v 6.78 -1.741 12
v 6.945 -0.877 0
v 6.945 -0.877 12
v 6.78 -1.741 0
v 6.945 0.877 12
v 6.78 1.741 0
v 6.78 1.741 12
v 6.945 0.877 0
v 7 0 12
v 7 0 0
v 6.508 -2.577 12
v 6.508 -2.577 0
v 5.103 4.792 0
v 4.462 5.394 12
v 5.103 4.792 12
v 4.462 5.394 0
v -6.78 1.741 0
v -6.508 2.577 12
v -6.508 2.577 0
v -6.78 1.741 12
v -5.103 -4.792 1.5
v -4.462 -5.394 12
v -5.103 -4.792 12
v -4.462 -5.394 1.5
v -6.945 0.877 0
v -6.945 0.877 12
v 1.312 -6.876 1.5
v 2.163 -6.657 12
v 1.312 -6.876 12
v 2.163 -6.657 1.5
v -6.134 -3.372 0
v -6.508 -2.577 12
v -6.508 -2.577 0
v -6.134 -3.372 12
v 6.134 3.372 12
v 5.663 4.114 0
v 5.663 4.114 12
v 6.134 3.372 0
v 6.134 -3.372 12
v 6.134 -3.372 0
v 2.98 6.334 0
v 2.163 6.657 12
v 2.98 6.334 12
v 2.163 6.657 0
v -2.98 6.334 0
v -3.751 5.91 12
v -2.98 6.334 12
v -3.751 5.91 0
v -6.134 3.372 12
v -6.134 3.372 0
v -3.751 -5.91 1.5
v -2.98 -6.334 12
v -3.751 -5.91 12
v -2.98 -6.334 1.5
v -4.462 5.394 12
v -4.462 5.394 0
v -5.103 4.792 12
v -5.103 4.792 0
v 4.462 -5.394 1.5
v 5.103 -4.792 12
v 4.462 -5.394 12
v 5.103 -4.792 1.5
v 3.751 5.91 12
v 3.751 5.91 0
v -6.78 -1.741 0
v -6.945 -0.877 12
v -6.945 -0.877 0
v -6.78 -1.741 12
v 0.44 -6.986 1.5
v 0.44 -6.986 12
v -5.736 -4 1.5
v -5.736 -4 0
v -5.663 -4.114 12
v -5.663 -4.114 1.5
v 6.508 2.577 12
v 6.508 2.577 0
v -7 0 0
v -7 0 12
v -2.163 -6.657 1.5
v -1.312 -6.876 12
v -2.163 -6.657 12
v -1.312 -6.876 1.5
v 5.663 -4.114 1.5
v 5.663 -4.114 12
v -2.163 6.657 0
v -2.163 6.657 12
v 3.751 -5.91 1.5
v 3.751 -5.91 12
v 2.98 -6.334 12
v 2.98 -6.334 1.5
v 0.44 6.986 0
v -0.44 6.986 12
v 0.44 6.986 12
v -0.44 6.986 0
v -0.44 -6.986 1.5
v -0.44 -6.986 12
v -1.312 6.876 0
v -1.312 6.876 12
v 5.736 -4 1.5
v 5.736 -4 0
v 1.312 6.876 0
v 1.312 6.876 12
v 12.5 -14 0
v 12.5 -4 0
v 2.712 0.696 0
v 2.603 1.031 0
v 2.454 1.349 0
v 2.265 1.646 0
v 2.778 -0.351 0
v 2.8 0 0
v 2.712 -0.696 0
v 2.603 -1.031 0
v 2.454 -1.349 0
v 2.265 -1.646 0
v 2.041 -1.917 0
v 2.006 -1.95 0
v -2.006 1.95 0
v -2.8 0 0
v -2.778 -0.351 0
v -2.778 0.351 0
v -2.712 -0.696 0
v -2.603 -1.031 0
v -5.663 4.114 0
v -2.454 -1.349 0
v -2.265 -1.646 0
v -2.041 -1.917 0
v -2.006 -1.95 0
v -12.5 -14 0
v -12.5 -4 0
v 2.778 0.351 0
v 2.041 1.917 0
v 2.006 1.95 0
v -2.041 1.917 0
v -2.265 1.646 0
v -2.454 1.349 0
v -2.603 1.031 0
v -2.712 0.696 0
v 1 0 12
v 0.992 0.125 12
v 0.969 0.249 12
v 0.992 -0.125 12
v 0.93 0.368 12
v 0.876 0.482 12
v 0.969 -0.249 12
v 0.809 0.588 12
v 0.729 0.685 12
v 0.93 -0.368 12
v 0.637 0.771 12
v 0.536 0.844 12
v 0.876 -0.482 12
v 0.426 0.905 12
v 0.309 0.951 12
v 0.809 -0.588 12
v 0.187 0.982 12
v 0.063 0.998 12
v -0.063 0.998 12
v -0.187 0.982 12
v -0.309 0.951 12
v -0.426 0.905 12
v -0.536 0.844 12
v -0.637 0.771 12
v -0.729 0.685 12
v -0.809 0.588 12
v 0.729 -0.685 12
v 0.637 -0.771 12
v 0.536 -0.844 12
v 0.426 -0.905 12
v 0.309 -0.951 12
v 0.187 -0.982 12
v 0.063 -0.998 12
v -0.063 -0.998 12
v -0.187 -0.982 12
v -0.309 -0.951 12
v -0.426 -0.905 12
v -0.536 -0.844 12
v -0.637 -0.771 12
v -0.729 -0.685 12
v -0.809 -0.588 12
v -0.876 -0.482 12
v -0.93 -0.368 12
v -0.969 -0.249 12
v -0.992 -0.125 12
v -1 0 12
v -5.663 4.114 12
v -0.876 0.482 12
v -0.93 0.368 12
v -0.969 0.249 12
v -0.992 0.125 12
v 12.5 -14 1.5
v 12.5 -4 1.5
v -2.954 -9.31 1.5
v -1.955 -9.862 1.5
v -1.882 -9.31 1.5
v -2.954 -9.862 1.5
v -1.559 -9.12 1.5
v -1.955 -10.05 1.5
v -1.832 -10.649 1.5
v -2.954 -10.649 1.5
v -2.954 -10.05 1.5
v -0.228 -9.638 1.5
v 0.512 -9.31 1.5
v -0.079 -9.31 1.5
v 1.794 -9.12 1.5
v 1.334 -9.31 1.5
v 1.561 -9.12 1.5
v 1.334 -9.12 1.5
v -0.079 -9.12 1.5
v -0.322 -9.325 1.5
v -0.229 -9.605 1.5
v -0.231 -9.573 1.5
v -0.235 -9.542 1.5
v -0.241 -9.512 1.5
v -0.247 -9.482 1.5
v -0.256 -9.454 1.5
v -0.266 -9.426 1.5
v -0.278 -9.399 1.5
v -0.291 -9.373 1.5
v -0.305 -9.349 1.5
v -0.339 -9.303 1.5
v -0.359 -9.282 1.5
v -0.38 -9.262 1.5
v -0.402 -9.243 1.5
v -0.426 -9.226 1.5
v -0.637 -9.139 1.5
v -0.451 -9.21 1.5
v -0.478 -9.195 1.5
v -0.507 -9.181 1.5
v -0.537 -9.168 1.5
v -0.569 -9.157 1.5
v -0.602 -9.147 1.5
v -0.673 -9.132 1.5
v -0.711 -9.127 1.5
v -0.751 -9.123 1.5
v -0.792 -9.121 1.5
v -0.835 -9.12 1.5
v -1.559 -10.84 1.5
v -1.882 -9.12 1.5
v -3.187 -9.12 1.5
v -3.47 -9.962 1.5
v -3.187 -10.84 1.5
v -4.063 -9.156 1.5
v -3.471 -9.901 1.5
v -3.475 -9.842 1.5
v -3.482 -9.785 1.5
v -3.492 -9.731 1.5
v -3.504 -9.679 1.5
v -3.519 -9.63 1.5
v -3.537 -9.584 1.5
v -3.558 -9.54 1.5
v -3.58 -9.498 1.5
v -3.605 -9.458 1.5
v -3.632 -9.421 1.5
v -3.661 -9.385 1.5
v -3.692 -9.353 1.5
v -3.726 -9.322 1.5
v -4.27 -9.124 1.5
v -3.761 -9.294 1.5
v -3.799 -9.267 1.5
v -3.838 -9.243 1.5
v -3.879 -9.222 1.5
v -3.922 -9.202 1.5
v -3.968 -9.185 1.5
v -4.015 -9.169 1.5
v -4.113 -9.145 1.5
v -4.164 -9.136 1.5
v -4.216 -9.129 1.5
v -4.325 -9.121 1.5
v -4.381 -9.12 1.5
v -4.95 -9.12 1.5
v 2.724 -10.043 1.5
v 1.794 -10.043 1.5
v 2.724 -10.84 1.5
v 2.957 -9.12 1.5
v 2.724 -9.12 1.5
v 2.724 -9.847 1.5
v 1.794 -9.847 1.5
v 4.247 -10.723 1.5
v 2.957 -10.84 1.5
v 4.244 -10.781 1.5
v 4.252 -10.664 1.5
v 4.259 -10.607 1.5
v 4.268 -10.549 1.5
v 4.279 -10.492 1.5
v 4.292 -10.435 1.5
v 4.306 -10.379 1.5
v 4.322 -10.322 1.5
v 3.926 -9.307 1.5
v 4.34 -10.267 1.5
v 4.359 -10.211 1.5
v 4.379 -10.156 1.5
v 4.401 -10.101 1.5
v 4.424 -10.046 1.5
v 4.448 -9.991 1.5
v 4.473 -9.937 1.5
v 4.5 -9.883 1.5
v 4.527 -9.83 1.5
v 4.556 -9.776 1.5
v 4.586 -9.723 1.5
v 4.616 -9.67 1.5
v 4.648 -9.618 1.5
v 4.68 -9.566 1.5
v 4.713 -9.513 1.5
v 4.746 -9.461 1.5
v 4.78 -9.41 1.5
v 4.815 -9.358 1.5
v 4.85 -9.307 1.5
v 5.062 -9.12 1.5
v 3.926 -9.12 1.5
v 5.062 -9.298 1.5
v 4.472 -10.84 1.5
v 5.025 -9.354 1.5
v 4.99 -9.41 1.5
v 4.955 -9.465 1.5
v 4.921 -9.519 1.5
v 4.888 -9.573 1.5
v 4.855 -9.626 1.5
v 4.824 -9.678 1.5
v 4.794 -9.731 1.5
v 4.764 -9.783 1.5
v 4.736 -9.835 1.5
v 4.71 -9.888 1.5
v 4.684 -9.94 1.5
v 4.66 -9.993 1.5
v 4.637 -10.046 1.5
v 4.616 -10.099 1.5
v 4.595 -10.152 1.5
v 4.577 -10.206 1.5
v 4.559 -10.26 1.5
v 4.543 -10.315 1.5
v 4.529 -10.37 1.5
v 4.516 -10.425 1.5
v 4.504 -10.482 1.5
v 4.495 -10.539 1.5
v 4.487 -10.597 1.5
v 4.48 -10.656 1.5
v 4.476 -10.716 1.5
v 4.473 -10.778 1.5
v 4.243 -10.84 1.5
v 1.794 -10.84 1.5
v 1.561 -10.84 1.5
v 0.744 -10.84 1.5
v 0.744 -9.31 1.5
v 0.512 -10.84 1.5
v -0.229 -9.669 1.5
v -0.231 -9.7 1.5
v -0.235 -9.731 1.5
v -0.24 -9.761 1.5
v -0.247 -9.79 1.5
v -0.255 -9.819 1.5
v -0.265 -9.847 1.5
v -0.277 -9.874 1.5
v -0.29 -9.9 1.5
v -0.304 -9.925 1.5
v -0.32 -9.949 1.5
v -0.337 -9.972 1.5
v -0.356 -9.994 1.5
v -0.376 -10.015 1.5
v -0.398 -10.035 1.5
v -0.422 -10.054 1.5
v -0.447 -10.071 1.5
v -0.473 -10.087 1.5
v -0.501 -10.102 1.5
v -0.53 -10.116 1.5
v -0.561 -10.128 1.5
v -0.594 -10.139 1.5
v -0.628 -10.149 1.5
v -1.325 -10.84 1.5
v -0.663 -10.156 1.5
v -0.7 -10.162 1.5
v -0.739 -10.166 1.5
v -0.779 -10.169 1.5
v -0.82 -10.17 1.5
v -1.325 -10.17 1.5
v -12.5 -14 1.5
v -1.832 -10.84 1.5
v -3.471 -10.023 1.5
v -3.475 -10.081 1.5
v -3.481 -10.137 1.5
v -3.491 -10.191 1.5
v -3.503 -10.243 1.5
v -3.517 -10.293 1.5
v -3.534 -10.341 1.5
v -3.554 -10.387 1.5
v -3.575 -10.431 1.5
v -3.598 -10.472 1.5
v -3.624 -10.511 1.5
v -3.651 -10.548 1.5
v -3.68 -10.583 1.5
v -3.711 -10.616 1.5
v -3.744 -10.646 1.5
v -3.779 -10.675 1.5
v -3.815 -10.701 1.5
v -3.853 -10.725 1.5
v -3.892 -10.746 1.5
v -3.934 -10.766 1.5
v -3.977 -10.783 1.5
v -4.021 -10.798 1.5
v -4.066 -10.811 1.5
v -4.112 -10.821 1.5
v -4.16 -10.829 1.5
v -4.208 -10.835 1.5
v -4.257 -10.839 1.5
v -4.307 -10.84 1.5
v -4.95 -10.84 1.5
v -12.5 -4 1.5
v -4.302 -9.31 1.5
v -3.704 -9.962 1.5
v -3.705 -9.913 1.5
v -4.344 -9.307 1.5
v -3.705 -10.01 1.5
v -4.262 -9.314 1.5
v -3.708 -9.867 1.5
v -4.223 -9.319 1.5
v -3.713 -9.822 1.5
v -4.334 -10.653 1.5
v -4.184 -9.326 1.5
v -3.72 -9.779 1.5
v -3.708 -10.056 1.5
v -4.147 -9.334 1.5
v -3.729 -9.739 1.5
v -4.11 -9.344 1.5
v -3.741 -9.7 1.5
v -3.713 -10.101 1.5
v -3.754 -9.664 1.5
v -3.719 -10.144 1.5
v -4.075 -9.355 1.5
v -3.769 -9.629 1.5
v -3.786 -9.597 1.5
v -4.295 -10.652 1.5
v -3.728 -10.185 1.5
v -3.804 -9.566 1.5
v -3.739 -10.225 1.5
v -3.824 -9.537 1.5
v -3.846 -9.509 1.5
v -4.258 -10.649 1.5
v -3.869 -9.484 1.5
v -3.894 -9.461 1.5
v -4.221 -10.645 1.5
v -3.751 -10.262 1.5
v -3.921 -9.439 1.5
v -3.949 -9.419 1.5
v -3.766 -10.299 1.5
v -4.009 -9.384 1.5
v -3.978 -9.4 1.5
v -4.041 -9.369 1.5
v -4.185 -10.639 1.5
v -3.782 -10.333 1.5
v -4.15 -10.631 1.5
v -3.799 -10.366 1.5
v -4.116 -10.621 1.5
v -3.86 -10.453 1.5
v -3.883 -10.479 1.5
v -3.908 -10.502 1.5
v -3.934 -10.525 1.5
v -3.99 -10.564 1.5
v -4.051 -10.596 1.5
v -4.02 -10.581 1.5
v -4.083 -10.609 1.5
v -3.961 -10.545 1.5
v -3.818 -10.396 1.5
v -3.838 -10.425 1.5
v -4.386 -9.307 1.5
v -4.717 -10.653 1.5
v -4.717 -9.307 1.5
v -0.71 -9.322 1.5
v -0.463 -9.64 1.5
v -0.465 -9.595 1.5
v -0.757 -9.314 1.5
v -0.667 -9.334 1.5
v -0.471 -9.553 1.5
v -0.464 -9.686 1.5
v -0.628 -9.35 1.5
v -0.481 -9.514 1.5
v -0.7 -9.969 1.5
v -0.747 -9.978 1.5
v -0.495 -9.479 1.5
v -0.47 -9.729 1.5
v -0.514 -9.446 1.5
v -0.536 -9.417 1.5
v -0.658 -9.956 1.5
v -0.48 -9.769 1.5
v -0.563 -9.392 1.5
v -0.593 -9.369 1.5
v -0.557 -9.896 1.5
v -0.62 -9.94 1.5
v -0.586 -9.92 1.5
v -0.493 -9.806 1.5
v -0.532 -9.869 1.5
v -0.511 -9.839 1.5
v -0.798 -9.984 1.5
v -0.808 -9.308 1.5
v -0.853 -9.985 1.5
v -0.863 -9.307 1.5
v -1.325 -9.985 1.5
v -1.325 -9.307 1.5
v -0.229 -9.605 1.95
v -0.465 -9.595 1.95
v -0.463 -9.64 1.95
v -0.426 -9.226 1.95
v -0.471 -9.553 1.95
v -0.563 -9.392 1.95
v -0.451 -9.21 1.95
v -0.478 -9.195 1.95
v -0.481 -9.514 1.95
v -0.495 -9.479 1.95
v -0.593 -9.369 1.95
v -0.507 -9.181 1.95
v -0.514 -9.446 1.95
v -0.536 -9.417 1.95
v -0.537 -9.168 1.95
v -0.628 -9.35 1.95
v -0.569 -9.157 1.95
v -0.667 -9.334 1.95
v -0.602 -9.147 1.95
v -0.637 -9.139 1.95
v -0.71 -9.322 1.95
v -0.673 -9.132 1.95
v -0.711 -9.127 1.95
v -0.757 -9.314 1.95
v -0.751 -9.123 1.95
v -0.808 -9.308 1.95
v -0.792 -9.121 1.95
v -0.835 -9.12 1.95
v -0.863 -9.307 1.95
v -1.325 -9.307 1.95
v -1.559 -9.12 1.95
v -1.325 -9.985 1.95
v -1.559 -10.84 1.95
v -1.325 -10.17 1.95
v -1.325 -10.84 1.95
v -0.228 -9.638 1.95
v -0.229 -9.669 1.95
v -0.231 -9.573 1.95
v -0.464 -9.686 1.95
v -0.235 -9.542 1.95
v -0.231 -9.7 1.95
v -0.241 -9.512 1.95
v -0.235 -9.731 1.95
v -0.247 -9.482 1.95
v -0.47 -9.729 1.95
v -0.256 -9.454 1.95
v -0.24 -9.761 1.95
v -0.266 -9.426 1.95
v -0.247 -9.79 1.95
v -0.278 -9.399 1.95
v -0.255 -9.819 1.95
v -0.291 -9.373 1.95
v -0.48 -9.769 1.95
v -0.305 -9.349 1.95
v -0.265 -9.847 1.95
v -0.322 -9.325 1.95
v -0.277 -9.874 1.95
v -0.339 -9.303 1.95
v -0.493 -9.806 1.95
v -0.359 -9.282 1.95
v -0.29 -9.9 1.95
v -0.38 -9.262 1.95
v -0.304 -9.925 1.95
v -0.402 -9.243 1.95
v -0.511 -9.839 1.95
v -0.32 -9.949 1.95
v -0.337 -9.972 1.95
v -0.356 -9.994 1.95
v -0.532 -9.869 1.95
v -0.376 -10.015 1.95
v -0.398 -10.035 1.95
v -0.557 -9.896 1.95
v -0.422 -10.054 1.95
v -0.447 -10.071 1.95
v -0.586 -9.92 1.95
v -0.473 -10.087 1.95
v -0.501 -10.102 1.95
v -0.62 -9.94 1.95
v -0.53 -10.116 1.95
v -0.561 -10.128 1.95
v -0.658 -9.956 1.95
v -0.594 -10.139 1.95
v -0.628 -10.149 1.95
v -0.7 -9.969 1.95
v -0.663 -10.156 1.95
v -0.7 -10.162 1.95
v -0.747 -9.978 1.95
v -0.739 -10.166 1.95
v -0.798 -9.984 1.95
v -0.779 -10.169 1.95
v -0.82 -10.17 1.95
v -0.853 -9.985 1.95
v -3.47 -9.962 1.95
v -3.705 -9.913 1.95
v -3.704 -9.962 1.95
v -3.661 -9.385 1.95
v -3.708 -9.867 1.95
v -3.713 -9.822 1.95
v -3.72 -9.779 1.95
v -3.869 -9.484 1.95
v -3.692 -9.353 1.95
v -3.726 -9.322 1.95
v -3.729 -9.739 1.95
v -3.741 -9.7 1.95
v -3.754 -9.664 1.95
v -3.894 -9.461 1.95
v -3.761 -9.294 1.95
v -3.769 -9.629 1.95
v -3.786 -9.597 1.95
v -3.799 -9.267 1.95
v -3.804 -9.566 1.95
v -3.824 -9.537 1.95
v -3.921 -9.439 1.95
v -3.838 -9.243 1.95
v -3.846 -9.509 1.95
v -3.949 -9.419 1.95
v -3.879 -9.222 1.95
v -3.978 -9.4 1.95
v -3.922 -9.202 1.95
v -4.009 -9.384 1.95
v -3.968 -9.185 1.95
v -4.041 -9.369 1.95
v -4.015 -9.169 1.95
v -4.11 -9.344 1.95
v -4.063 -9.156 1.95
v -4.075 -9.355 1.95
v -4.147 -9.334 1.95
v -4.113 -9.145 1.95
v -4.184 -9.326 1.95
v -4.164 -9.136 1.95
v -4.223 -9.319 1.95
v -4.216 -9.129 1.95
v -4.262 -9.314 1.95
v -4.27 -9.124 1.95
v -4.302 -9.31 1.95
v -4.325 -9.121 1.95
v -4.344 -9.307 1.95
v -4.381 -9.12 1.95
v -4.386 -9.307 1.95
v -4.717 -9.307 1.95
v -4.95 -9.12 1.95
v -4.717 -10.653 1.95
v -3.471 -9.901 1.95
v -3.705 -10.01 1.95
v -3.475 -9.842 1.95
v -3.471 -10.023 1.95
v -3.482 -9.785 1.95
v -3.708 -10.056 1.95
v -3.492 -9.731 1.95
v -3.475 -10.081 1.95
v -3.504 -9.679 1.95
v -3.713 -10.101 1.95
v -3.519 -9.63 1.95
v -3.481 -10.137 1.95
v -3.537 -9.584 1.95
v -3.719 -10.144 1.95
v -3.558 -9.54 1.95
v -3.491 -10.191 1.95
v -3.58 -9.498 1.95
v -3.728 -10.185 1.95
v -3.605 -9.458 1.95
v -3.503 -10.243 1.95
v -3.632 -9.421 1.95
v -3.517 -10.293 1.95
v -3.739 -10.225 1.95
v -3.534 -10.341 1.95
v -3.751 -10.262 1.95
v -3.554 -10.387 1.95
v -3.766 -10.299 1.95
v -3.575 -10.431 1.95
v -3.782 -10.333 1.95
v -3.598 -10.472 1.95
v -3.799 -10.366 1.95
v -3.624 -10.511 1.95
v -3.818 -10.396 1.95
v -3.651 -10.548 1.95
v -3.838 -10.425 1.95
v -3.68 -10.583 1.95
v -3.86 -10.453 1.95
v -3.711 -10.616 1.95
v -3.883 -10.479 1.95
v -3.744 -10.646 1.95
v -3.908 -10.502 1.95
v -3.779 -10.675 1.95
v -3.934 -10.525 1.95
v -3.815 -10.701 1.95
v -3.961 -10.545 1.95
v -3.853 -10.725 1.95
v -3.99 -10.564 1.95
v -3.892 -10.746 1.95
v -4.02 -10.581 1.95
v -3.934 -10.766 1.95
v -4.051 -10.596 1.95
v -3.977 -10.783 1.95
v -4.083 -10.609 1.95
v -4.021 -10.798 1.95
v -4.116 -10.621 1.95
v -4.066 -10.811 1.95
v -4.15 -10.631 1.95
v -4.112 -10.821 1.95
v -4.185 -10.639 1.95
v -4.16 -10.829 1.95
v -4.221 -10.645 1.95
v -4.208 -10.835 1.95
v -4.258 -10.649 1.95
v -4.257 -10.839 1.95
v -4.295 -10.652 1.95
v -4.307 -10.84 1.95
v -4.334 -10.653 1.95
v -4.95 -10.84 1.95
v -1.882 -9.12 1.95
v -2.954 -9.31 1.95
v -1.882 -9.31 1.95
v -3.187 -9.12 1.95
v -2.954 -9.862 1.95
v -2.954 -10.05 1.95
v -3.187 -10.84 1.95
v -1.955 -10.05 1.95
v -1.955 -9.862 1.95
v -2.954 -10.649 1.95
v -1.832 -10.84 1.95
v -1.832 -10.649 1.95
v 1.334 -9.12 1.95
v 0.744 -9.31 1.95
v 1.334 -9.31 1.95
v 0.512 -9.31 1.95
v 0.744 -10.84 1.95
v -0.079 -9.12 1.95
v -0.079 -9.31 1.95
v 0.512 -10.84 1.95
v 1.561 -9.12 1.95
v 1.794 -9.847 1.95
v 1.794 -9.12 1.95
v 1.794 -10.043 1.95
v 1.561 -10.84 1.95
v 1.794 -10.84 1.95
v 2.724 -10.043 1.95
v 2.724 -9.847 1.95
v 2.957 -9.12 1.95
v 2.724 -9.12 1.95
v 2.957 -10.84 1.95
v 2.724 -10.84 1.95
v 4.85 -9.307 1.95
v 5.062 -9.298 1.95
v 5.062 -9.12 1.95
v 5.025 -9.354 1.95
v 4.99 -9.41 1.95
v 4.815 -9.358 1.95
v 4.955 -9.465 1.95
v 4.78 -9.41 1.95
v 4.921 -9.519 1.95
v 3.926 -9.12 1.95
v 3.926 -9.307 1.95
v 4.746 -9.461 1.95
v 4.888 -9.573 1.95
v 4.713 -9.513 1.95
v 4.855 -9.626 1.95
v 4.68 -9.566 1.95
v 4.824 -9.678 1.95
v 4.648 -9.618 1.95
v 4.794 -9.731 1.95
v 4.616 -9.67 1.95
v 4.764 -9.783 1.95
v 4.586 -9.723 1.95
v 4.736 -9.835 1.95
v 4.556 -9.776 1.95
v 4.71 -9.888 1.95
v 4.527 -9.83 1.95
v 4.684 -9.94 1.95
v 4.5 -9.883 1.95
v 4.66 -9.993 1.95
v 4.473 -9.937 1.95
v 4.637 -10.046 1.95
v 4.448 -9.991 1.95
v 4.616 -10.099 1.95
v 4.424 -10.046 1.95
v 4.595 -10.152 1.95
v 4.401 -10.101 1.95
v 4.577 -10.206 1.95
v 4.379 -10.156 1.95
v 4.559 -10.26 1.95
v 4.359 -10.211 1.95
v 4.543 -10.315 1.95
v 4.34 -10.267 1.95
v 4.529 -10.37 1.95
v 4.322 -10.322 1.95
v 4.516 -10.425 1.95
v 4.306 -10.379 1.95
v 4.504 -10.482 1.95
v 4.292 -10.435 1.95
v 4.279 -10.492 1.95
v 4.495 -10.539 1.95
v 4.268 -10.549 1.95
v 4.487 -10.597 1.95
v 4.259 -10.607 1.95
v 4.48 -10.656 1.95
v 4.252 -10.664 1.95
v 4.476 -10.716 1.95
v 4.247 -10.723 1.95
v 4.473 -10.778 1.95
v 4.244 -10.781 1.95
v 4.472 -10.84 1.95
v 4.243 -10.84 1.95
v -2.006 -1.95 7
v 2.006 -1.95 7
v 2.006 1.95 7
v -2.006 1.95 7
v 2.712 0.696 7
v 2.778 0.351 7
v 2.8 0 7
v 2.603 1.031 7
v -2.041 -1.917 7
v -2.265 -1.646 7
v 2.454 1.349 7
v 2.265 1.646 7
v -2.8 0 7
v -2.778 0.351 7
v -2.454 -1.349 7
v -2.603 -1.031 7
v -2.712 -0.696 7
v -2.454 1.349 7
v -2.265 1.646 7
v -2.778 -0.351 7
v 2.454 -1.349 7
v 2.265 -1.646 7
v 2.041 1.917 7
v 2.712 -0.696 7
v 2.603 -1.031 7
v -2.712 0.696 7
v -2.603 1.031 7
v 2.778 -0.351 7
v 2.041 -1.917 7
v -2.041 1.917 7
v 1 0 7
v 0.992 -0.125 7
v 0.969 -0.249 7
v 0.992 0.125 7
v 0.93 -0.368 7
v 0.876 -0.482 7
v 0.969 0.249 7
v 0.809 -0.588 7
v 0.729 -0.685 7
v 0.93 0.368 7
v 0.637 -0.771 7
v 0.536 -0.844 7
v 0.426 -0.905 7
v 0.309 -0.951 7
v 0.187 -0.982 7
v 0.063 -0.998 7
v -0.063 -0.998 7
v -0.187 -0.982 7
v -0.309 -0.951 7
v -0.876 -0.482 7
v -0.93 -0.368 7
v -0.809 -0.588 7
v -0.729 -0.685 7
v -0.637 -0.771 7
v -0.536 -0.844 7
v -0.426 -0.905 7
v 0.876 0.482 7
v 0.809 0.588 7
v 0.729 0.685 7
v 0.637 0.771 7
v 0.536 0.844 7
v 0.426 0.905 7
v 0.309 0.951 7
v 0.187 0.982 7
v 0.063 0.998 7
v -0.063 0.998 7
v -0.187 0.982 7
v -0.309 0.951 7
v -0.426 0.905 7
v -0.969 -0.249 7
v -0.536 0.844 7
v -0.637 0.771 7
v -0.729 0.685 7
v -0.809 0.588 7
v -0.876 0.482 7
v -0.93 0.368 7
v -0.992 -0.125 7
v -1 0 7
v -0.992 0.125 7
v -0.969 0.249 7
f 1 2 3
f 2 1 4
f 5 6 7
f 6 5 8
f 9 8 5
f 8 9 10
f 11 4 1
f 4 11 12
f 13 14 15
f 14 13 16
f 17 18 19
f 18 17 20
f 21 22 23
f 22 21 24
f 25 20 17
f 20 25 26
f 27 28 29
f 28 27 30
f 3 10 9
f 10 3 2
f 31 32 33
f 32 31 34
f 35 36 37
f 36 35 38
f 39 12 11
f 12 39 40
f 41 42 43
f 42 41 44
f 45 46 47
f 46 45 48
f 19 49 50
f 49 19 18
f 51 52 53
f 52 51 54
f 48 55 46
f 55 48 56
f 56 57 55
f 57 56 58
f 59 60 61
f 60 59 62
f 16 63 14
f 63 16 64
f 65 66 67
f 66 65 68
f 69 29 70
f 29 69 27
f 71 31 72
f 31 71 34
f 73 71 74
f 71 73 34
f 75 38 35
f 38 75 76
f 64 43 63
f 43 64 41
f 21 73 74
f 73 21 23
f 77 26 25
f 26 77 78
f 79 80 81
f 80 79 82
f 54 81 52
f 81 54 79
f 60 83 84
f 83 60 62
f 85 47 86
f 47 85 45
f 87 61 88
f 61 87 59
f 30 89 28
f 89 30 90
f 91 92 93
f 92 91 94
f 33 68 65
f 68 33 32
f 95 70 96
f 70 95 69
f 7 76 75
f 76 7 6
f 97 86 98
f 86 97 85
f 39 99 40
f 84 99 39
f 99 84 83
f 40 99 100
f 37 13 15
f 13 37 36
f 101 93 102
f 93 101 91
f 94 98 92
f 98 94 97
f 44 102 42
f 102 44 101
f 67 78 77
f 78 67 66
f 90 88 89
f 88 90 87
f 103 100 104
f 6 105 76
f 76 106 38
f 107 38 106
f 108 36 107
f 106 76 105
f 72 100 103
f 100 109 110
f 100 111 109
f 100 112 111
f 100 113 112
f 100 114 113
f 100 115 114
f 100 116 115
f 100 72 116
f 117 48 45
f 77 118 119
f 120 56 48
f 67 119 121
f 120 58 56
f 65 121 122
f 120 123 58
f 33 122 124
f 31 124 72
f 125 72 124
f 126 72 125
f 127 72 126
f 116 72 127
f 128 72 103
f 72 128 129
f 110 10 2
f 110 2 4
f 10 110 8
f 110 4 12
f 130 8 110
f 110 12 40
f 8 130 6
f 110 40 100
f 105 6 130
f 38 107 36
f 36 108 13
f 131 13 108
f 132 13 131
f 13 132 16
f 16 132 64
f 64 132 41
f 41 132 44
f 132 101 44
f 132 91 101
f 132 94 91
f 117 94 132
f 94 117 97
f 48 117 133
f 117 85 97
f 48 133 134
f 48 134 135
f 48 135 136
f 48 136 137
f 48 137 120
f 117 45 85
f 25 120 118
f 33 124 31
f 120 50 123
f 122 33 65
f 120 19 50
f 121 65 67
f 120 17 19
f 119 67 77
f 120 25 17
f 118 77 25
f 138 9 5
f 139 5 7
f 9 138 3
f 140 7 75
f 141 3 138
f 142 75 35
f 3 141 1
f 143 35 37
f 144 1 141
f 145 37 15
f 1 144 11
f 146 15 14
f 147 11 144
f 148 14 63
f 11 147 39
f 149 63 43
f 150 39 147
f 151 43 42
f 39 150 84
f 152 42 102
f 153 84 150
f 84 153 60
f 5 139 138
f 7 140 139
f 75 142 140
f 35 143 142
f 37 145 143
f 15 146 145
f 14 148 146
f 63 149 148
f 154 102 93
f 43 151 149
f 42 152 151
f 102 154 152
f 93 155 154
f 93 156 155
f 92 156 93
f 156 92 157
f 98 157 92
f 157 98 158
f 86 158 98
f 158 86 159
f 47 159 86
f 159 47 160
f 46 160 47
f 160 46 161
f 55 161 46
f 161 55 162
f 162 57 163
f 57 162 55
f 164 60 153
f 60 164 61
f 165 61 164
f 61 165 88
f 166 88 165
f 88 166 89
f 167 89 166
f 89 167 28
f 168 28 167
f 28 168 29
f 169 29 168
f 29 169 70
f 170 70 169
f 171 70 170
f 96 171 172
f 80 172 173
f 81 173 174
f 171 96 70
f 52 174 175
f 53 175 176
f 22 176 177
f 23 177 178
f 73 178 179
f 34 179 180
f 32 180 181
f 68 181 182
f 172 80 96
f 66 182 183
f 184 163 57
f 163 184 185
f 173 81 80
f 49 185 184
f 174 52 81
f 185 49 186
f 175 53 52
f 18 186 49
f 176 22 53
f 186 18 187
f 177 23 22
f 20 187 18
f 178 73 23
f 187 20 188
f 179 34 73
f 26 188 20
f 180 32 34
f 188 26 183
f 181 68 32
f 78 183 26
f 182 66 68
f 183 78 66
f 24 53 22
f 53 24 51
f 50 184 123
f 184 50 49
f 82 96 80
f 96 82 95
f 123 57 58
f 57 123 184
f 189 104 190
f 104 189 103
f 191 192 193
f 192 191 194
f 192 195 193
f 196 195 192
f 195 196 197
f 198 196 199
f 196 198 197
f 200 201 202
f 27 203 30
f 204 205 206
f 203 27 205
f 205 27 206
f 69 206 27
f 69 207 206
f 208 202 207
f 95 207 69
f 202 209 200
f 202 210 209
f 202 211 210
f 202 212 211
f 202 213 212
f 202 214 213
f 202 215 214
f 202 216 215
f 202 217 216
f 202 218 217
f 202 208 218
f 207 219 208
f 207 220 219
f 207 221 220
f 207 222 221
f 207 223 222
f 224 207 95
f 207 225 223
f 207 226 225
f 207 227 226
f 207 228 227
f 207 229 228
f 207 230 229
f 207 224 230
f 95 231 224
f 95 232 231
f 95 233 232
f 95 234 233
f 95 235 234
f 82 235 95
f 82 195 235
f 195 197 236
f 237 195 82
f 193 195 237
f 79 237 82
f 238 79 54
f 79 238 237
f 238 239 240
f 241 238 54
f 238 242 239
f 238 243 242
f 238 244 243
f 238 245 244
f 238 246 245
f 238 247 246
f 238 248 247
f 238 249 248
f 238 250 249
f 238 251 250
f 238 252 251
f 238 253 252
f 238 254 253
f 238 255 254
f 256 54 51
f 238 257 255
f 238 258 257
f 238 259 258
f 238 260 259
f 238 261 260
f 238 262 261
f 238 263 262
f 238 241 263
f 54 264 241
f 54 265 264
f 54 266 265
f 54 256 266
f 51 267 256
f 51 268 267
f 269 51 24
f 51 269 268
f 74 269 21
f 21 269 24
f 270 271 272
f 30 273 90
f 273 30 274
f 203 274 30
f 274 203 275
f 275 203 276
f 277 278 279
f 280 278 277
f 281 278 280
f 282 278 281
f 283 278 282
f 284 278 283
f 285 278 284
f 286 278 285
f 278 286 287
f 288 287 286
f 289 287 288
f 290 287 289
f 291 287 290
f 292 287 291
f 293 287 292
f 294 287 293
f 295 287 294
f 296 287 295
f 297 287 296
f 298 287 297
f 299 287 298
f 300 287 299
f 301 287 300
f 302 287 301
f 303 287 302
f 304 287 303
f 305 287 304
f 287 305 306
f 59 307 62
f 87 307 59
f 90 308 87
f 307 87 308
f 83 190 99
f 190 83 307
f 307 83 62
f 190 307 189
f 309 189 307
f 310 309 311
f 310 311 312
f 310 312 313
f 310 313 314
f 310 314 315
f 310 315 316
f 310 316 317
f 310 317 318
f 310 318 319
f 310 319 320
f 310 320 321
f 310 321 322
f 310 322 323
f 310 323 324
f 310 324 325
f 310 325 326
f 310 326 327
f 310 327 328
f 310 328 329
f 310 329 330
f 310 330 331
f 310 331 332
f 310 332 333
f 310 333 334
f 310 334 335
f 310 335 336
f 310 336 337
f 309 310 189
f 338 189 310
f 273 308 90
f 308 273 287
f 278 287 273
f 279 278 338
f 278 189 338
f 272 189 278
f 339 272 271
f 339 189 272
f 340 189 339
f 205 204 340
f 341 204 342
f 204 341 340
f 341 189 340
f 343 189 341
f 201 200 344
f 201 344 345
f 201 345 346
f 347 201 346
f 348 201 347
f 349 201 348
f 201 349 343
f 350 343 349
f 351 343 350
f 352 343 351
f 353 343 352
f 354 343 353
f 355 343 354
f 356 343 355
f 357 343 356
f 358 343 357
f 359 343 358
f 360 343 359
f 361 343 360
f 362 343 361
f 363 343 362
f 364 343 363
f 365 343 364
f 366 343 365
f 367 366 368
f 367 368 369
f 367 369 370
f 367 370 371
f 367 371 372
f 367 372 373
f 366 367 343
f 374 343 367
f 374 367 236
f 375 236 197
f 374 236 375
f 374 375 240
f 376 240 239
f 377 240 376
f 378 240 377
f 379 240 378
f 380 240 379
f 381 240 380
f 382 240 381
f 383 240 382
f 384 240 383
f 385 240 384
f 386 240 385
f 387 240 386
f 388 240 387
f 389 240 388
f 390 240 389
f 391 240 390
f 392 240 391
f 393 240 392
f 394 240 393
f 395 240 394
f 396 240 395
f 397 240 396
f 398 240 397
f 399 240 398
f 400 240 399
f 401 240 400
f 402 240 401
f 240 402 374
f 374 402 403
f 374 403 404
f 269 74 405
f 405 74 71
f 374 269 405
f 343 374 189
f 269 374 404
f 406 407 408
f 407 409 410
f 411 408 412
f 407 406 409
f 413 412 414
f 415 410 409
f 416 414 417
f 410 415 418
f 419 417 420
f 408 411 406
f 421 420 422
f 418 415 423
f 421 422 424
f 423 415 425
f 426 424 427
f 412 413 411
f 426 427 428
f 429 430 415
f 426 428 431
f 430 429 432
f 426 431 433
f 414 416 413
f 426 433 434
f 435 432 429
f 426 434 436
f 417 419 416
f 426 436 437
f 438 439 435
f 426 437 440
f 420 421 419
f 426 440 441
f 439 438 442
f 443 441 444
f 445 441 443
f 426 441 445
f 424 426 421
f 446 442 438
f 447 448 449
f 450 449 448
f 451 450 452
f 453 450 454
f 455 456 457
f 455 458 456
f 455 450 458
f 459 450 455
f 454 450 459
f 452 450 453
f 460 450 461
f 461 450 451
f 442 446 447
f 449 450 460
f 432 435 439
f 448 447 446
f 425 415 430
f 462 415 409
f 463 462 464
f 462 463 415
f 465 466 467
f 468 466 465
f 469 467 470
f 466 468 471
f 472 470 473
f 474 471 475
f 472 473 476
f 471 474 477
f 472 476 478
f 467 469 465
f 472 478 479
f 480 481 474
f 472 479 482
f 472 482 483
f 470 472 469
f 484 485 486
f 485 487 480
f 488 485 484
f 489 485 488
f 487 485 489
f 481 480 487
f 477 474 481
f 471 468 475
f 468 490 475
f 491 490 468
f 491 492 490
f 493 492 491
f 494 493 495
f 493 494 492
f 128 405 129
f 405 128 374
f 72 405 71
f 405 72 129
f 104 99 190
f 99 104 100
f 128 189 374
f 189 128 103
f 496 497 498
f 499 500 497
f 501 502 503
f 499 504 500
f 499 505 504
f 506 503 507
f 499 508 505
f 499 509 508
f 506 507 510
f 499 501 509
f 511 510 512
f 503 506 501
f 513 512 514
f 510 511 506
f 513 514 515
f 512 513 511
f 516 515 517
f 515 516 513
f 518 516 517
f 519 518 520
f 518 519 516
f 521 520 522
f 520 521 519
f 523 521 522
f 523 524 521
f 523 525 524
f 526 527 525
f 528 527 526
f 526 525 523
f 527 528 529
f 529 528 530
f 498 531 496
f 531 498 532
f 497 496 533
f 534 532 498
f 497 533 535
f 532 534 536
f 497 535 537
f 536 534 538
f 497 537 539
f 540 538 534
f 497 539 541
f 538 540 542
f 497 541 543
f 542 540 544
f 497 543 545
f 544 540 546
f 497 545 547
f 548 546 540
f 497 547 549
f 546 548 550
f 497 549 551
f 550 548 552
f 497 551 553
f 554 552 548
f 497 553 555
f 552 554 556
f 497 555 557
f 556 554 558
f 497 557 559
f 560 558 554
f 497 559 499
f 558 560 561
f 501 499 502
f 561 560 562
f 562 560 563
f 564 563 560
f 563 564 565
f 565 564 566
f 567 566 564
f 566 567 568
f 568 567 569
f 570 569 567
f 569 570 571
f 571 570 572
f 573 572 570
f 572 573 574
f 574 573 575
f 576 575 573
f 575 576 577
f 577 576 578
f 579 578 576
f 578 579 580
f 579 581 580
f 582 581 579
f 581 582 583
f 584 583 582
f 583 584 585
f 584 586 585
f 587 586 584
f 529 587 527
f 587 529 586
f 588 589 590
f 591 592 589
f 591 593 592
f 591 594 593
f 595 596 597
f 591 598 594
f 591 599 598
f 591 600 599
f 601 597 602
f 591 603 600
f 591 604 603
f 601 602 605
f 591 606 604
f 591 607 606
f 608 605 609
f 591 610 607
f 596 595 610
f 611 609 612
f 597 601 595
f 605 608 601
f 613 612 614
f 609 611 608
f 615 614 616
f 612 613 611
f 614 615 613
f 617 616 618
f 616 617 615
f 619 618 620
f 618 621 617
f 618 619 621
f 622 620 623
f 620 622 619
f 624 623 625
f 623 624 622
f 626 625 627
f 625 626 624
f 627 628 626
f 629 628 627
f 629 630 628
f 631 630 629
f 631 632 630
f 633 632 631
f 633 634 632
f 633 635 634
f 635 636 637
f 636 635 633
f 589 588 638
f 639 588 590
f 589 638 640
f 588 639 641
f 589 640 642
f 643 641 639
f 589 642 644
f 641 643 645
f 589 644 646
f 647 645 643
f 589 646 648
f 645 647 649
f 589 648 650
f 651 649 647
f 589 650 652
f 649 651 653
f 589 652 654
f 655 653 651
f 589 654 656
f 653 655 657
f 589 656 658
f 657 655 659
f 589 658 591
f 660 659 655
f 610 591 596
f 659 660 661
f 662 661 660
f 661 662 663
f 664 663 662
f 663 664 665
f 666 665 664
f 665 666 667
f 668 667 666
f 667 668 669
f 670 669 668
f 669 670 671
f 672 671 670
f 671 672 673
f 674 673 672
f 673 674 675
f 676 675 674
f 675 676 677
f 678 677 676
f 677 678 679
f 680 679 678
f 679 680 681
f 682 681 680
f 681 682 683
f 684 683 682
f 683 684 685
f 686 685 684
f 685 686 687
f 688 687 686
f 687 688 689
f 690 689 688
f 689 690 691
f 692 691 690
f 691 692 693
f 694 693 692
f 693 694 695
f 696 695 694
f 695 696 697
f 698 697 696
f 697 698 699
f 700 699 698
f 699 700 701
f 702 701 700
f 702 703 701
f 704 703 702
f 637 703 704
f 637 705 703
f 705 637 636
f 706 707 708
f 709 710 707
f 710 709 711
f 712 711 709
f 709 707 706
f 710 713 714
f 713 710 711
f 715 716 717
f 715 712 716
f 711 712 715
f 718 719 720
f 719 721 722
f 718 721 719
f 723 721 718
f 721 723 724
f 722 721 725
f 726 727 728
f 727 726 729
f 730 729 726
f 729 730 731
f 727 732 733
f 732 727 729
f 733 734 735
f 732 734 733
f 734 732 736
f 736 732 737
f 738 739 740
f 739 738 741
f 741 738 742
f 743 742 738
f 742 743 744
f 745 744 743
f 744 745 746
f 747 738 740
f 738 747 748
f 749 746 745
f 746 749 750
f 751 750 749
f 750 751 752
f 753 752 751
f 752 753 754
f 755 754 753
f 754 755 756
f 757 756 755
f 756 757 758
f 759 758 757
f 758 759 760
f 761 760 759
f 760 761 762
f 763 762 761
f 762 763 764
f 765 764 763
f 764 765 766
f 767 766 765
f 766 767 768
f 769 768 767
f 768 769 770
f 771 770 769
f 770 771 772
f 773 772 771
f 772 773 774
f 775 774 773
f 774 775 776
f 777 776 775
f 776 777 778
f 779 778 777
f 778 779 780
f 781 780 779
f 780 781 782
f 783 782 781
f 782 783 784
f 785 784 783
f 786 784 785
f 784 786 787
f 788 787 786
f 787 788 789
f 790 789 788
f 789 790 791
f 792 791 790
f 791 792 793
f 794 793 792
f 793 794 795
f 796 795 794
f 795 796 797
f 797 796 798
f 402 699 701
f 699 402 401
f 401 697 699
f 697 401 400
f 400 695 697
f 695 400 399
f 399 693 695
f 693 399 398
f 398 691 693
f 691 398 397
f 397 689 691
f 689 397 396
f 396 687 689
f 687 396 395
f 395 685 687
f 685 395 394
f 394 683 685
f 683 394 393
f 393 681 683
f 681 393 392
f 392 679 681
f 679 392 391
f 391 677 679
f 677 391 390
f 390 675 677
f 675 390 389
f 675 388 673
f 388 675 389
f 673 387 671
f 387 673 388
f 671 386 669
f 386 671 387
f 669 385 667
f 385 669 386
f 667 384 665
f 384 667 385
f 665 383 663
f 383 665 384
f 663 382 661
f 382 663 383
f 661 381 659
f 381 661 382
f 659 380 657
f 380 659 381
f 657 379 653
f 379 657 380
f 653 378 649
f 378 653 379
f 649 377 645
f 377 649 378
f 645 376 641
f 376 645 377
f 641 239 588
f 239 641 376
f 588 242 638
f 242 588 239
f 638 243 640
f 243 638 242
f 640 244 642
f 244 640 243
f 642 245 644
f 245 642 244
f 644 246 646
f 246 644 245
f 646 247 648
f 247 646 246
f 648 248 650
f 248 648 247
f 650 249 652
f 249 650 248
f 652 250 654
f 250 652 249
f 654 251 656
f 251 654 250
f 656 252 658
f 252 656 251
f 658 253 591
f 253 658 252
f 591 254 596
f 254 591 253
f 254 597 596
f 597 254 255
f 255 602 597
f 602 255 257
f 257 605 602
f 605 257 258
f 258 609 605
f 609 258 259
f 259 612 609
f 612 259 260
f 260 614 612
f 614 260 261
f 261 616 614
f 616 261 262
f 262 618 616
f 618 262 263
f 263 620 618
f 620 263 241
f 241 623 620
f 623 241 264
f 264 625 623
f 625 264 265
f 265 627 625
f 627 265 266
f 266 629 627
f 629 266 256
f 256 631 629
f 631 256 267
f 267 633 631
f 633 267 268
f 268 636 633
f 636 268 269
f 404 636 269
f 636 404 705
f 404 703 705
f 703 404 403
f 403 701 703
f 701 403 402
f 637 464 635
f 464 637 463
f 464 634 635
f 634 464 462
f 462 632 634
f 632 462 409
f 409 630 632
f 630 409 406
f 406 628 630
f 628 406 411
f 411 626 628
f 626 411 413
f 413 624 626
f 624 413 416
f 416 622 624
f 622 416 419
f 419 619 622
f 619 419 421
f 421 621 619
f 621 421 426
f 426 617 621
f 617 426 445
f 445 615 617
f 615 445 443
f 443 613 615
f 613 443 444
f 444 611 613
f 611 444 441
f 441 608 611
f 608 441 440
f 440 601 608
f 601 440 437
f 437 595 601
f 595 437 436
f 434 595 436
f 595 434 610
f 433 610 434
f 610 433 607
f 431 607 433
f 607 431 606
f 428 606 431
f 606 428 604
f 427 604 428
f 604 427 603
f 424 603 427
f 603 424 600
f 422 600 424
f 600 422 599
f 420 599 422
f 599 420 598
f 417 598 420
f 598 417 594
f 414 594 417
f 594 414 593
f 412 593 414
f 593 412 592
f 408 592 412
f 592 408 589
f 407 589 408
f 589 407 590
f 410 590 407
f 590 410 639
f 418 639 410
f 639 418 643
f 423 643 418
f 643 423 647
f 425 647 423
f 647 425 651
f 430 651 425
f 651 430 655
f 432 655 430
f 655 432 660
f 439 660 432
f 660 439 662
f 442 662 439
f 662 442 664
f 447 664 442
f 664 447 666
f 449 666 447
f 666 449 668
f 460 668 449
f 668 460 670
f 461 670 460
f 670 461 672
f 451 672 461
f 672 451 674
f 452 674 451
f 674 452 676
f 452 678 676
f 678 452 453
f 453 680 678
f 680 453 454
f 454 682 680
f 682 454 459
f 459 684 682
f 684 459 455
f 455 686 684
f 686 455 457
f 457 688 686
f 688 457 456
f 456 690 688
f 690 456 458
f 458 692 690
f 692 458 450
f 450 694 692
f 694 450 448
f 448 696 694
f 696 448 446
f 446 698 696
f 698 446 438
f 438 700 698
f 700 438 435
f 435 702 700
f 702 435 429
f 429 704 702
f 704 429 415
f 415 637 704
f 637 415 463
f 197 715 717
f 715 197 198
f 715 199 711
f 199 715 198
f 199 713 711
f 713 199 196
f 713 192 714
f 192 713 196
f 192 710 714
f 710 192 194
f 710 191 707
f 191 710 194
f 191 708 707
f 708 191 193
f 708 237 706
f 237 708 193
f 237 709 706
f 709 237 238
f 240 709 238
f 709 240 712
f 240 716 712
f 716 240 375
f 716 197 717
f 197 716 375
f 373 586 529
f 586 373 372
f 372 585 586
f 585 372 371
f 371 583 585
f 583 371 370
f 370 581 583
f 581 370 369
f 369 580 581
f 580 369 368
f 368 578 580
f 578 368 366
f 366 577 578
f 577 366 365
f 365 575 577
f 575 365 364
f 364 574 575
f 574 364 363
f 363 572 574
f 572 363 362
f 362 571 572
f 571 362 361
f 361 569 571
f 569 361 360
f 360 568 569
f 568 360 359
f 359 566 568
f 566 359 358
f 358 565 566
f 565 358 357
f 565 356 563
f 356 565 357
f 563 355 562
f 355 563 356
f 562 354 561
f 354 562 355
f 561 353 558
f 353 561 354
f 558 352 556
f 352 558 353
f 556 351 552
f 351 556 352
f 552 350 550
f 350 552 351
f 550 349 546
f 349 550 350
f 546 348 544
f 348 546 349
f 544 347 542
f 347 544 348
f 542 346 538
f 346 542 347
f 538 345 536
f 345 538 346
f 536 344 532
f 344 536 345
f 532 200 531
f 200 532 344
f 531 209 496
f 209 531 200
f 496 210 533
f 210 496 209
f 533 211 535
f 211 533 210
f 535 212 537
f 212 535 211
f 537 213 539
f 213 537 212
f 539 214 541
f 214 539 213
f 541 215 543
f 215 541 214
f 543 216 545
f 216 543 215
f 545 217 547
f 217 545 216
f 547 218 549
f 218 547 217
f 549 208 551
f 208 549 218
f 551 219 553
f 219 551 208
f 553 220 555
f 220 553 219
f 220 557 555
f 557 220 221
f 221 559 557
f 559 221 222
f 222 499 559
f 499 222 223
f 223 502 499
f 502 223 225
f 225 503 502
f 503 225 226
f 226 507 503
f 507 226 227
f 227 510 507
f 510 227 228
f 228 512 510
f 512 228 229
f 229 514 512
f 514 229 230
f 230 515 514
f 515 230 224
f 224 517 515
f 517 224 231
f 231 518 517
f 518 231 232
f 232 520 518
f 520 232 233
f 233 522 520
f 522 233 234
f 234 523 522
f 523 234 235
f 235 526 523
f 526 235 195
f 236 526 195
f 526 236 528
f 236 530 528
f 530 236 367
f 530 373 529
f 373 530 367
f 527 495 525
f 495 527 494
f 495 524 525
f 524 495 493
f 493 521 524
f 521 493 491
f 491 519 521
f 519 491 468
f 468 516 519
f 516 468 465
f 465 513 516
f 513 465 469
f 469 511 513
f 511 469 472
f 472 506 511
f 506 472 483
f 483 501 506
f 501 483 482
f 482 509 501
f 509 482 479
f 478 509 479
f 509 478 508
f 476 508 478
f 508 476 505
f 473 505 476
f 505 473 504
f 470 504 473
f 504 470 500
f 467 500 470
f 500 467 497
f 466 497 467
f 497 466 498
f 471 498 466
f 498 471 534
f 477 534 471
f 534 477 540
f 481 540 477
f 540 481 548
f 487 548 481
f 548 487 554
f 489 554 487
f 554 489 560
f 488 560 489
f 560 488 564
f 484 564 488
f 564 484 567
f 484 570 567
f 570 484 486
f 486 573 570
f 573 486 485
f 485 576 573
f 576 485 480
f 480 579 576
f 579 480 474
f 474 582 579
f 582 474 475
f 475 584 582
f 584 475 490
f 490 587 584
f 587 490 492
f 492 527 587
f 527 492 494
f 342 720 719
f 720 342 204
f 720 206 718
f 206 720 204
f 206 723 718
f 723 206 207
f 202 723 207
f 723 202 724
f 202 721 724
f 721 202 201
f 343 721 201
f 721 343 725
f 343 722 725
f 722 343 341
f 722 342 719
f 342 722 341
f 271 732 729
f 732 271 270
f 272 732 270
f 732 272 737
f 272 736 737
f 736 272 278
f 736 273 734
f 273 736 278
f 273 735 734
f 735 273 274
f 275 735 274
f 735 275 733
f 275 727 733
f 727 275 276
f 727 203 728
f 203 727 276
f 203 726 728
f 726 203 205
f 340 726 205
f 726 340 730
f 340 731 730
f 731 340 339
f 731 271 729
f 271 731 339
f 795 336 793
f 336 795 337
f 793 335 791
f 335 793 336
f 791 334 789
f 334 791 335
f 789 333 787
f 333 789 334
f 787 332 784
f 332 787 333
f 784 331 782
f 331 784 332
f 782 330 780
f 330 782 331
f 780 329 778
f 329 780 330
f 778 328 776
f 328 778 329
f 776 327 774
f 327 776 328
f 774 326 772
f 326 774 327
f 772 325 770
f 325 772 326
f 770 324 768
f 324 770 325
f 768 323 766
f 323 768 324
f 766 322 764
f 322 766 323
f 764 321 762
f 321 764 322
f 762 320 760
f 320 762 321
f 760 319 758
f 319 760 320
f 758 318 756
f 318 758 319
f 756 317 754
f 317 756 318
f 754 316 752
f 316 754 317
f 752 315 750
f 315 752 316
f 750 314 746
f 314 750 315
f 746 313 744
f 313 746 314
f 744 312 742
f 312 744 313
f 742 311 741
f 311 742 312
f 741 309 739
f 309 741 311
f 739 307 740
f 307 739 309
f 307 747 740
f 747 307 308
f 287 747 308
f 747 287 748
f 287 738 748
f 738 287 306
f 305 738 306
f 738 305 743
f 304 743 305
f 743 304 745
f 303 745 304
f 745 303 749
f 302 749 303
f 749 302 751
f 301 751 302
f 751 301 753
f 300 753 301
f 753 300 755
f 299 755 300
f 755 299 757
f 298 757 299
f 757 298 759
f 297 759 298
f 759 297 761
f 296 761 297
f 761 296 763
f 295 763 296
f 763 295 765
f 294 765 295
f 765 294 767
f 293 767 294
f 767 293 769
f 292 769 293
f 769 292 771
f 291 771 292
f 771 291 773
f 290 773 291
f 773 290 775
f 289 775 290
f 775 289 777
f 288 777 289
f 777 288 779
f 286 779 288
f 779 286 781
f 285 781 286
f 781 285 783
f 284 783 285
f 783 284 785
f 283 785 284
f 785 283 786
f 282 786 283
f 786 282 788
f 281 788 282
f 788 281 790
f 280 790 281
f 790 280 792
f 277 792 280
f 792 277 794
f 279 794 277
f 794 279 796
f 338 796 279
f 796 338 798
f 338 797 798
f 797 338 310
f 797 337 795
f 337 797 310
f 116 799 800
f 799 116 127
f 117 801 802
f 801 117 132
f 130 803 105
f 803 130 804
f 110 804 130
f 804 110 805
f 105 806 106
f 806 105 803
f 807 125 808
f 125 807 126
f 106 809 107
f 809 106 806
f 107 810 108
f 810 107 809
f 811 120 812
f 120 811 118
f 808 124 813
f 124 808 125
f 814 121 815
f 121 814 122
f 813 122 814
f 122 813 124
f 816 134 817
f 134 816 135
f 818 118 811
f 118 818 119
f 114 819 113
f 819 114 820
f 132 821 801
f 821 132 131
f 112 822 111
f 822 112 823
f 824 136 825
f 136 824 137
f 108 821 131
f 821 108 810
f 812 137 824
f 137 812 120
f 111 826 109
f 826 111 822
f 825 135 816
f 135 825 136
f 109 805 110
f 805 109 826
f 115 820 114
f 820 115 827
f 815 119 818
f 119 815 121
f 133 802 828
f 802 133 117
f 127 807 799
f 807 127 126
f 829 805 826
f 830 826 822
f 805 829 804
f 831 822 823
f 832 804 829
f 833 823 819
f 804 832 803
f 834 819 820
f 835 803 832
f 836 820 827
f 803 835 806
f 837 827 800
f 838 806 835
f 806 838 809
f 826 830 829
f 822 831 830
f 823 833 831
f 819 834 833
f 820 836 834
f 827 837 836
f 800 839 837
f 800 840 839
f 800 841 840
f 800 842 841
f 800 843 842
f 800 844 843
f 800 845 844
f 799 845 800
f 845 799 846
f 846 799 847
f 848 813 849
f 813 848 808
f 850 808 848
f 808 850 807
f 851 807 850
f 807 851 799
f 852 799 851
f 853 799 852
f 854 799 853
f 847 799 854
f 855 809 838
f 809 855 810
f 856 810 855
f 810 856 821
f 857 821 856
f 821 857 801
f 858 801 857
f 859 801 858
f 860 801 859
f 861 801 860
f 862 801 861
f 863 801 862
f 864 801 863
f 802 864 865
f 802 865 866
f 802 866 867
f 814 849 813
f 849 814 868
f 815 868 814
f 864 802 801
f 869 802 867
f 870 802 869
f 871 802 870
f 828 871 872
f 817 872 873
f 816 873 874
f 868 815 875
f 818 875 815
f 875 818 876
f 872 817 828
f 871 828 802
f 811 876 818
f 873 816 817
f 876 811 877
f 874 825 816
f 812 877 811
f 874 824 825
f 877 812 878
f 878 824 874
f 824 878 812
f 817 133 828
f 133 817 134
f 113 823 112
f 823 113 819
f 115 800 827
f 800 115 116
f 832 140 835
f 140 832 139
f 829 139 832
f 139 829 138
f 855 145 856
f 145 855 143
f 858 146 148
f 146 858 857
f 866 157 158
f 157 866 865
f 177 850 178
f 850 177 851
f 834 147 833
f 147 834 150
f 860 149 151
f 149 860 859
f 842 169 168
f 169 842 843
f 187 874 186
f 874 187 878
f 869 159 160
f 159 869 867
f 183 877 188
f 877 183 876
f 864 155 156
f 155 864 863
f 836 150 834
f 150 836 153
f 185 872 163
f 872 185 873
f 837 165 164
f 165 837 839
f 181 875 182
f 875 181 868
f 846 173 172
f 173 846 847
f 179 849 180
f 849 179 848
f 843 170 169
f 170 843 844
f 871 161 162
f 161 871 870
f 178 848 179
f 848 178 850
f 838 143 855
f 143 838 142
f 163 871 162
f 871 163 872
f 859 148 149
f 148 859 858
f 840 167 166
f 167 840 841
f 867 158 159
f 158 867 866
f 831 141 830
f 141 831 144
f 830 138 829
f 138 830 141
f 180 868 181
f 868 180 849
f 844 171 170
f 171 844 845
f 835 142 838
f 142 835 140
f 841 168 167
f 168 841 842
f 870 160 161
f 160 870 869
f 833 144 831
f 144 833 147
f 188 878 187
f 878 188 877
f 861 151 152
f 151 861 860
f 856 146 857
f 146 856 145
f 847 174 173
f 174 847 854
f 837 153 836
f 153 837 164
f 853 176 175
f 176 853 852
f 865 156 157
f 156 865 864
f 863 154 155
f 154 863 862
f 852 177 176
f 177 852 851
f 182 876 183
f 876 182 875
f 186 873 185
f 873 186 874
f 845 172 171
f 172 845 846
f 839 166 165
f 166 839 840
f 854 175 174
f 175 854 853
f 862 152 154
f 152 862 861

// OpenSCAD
$fn = 50;

difference() {
	union() {
		cylinder(h = 12, r = 7);
		translate(v = [-12.5, -14.0, 0]) {
			cube(size = [25, 10, 1.5]);
		}
		translate(v = [0, -10, 1.5]) {
			linear_extrude(height = 0.45) {
				text(font = "Liberation Sans", halign = "center", size = 1.8, text = "DEPTH 7", valign = "center");
			}
		}
	}
	union() {
		translate(v = [0, 0, 0]) {
			rotate(a = [0, 0, 0]) {
				difference() {
					union() {
						translate(v = [0, 0, -0.10000000000000009]) {
							cylinder(h = 7.1, r = 2.8000000000000003);
						}
					}
					union() {
						translate(v = [-20.0, -21.95, -1.1]) {
							cube(size = [40, 20, 9.1]);
						}
						translate(v = [-20.0, 1.9499999999999993, -1.1]) {
							cube(size = [40, 20, 9.1]);
						}
					}
				}
			}
		}
		translate(v = [0, 0, 7]) {
			cylinder(h = 6, r = 1);
		}
	}
}
